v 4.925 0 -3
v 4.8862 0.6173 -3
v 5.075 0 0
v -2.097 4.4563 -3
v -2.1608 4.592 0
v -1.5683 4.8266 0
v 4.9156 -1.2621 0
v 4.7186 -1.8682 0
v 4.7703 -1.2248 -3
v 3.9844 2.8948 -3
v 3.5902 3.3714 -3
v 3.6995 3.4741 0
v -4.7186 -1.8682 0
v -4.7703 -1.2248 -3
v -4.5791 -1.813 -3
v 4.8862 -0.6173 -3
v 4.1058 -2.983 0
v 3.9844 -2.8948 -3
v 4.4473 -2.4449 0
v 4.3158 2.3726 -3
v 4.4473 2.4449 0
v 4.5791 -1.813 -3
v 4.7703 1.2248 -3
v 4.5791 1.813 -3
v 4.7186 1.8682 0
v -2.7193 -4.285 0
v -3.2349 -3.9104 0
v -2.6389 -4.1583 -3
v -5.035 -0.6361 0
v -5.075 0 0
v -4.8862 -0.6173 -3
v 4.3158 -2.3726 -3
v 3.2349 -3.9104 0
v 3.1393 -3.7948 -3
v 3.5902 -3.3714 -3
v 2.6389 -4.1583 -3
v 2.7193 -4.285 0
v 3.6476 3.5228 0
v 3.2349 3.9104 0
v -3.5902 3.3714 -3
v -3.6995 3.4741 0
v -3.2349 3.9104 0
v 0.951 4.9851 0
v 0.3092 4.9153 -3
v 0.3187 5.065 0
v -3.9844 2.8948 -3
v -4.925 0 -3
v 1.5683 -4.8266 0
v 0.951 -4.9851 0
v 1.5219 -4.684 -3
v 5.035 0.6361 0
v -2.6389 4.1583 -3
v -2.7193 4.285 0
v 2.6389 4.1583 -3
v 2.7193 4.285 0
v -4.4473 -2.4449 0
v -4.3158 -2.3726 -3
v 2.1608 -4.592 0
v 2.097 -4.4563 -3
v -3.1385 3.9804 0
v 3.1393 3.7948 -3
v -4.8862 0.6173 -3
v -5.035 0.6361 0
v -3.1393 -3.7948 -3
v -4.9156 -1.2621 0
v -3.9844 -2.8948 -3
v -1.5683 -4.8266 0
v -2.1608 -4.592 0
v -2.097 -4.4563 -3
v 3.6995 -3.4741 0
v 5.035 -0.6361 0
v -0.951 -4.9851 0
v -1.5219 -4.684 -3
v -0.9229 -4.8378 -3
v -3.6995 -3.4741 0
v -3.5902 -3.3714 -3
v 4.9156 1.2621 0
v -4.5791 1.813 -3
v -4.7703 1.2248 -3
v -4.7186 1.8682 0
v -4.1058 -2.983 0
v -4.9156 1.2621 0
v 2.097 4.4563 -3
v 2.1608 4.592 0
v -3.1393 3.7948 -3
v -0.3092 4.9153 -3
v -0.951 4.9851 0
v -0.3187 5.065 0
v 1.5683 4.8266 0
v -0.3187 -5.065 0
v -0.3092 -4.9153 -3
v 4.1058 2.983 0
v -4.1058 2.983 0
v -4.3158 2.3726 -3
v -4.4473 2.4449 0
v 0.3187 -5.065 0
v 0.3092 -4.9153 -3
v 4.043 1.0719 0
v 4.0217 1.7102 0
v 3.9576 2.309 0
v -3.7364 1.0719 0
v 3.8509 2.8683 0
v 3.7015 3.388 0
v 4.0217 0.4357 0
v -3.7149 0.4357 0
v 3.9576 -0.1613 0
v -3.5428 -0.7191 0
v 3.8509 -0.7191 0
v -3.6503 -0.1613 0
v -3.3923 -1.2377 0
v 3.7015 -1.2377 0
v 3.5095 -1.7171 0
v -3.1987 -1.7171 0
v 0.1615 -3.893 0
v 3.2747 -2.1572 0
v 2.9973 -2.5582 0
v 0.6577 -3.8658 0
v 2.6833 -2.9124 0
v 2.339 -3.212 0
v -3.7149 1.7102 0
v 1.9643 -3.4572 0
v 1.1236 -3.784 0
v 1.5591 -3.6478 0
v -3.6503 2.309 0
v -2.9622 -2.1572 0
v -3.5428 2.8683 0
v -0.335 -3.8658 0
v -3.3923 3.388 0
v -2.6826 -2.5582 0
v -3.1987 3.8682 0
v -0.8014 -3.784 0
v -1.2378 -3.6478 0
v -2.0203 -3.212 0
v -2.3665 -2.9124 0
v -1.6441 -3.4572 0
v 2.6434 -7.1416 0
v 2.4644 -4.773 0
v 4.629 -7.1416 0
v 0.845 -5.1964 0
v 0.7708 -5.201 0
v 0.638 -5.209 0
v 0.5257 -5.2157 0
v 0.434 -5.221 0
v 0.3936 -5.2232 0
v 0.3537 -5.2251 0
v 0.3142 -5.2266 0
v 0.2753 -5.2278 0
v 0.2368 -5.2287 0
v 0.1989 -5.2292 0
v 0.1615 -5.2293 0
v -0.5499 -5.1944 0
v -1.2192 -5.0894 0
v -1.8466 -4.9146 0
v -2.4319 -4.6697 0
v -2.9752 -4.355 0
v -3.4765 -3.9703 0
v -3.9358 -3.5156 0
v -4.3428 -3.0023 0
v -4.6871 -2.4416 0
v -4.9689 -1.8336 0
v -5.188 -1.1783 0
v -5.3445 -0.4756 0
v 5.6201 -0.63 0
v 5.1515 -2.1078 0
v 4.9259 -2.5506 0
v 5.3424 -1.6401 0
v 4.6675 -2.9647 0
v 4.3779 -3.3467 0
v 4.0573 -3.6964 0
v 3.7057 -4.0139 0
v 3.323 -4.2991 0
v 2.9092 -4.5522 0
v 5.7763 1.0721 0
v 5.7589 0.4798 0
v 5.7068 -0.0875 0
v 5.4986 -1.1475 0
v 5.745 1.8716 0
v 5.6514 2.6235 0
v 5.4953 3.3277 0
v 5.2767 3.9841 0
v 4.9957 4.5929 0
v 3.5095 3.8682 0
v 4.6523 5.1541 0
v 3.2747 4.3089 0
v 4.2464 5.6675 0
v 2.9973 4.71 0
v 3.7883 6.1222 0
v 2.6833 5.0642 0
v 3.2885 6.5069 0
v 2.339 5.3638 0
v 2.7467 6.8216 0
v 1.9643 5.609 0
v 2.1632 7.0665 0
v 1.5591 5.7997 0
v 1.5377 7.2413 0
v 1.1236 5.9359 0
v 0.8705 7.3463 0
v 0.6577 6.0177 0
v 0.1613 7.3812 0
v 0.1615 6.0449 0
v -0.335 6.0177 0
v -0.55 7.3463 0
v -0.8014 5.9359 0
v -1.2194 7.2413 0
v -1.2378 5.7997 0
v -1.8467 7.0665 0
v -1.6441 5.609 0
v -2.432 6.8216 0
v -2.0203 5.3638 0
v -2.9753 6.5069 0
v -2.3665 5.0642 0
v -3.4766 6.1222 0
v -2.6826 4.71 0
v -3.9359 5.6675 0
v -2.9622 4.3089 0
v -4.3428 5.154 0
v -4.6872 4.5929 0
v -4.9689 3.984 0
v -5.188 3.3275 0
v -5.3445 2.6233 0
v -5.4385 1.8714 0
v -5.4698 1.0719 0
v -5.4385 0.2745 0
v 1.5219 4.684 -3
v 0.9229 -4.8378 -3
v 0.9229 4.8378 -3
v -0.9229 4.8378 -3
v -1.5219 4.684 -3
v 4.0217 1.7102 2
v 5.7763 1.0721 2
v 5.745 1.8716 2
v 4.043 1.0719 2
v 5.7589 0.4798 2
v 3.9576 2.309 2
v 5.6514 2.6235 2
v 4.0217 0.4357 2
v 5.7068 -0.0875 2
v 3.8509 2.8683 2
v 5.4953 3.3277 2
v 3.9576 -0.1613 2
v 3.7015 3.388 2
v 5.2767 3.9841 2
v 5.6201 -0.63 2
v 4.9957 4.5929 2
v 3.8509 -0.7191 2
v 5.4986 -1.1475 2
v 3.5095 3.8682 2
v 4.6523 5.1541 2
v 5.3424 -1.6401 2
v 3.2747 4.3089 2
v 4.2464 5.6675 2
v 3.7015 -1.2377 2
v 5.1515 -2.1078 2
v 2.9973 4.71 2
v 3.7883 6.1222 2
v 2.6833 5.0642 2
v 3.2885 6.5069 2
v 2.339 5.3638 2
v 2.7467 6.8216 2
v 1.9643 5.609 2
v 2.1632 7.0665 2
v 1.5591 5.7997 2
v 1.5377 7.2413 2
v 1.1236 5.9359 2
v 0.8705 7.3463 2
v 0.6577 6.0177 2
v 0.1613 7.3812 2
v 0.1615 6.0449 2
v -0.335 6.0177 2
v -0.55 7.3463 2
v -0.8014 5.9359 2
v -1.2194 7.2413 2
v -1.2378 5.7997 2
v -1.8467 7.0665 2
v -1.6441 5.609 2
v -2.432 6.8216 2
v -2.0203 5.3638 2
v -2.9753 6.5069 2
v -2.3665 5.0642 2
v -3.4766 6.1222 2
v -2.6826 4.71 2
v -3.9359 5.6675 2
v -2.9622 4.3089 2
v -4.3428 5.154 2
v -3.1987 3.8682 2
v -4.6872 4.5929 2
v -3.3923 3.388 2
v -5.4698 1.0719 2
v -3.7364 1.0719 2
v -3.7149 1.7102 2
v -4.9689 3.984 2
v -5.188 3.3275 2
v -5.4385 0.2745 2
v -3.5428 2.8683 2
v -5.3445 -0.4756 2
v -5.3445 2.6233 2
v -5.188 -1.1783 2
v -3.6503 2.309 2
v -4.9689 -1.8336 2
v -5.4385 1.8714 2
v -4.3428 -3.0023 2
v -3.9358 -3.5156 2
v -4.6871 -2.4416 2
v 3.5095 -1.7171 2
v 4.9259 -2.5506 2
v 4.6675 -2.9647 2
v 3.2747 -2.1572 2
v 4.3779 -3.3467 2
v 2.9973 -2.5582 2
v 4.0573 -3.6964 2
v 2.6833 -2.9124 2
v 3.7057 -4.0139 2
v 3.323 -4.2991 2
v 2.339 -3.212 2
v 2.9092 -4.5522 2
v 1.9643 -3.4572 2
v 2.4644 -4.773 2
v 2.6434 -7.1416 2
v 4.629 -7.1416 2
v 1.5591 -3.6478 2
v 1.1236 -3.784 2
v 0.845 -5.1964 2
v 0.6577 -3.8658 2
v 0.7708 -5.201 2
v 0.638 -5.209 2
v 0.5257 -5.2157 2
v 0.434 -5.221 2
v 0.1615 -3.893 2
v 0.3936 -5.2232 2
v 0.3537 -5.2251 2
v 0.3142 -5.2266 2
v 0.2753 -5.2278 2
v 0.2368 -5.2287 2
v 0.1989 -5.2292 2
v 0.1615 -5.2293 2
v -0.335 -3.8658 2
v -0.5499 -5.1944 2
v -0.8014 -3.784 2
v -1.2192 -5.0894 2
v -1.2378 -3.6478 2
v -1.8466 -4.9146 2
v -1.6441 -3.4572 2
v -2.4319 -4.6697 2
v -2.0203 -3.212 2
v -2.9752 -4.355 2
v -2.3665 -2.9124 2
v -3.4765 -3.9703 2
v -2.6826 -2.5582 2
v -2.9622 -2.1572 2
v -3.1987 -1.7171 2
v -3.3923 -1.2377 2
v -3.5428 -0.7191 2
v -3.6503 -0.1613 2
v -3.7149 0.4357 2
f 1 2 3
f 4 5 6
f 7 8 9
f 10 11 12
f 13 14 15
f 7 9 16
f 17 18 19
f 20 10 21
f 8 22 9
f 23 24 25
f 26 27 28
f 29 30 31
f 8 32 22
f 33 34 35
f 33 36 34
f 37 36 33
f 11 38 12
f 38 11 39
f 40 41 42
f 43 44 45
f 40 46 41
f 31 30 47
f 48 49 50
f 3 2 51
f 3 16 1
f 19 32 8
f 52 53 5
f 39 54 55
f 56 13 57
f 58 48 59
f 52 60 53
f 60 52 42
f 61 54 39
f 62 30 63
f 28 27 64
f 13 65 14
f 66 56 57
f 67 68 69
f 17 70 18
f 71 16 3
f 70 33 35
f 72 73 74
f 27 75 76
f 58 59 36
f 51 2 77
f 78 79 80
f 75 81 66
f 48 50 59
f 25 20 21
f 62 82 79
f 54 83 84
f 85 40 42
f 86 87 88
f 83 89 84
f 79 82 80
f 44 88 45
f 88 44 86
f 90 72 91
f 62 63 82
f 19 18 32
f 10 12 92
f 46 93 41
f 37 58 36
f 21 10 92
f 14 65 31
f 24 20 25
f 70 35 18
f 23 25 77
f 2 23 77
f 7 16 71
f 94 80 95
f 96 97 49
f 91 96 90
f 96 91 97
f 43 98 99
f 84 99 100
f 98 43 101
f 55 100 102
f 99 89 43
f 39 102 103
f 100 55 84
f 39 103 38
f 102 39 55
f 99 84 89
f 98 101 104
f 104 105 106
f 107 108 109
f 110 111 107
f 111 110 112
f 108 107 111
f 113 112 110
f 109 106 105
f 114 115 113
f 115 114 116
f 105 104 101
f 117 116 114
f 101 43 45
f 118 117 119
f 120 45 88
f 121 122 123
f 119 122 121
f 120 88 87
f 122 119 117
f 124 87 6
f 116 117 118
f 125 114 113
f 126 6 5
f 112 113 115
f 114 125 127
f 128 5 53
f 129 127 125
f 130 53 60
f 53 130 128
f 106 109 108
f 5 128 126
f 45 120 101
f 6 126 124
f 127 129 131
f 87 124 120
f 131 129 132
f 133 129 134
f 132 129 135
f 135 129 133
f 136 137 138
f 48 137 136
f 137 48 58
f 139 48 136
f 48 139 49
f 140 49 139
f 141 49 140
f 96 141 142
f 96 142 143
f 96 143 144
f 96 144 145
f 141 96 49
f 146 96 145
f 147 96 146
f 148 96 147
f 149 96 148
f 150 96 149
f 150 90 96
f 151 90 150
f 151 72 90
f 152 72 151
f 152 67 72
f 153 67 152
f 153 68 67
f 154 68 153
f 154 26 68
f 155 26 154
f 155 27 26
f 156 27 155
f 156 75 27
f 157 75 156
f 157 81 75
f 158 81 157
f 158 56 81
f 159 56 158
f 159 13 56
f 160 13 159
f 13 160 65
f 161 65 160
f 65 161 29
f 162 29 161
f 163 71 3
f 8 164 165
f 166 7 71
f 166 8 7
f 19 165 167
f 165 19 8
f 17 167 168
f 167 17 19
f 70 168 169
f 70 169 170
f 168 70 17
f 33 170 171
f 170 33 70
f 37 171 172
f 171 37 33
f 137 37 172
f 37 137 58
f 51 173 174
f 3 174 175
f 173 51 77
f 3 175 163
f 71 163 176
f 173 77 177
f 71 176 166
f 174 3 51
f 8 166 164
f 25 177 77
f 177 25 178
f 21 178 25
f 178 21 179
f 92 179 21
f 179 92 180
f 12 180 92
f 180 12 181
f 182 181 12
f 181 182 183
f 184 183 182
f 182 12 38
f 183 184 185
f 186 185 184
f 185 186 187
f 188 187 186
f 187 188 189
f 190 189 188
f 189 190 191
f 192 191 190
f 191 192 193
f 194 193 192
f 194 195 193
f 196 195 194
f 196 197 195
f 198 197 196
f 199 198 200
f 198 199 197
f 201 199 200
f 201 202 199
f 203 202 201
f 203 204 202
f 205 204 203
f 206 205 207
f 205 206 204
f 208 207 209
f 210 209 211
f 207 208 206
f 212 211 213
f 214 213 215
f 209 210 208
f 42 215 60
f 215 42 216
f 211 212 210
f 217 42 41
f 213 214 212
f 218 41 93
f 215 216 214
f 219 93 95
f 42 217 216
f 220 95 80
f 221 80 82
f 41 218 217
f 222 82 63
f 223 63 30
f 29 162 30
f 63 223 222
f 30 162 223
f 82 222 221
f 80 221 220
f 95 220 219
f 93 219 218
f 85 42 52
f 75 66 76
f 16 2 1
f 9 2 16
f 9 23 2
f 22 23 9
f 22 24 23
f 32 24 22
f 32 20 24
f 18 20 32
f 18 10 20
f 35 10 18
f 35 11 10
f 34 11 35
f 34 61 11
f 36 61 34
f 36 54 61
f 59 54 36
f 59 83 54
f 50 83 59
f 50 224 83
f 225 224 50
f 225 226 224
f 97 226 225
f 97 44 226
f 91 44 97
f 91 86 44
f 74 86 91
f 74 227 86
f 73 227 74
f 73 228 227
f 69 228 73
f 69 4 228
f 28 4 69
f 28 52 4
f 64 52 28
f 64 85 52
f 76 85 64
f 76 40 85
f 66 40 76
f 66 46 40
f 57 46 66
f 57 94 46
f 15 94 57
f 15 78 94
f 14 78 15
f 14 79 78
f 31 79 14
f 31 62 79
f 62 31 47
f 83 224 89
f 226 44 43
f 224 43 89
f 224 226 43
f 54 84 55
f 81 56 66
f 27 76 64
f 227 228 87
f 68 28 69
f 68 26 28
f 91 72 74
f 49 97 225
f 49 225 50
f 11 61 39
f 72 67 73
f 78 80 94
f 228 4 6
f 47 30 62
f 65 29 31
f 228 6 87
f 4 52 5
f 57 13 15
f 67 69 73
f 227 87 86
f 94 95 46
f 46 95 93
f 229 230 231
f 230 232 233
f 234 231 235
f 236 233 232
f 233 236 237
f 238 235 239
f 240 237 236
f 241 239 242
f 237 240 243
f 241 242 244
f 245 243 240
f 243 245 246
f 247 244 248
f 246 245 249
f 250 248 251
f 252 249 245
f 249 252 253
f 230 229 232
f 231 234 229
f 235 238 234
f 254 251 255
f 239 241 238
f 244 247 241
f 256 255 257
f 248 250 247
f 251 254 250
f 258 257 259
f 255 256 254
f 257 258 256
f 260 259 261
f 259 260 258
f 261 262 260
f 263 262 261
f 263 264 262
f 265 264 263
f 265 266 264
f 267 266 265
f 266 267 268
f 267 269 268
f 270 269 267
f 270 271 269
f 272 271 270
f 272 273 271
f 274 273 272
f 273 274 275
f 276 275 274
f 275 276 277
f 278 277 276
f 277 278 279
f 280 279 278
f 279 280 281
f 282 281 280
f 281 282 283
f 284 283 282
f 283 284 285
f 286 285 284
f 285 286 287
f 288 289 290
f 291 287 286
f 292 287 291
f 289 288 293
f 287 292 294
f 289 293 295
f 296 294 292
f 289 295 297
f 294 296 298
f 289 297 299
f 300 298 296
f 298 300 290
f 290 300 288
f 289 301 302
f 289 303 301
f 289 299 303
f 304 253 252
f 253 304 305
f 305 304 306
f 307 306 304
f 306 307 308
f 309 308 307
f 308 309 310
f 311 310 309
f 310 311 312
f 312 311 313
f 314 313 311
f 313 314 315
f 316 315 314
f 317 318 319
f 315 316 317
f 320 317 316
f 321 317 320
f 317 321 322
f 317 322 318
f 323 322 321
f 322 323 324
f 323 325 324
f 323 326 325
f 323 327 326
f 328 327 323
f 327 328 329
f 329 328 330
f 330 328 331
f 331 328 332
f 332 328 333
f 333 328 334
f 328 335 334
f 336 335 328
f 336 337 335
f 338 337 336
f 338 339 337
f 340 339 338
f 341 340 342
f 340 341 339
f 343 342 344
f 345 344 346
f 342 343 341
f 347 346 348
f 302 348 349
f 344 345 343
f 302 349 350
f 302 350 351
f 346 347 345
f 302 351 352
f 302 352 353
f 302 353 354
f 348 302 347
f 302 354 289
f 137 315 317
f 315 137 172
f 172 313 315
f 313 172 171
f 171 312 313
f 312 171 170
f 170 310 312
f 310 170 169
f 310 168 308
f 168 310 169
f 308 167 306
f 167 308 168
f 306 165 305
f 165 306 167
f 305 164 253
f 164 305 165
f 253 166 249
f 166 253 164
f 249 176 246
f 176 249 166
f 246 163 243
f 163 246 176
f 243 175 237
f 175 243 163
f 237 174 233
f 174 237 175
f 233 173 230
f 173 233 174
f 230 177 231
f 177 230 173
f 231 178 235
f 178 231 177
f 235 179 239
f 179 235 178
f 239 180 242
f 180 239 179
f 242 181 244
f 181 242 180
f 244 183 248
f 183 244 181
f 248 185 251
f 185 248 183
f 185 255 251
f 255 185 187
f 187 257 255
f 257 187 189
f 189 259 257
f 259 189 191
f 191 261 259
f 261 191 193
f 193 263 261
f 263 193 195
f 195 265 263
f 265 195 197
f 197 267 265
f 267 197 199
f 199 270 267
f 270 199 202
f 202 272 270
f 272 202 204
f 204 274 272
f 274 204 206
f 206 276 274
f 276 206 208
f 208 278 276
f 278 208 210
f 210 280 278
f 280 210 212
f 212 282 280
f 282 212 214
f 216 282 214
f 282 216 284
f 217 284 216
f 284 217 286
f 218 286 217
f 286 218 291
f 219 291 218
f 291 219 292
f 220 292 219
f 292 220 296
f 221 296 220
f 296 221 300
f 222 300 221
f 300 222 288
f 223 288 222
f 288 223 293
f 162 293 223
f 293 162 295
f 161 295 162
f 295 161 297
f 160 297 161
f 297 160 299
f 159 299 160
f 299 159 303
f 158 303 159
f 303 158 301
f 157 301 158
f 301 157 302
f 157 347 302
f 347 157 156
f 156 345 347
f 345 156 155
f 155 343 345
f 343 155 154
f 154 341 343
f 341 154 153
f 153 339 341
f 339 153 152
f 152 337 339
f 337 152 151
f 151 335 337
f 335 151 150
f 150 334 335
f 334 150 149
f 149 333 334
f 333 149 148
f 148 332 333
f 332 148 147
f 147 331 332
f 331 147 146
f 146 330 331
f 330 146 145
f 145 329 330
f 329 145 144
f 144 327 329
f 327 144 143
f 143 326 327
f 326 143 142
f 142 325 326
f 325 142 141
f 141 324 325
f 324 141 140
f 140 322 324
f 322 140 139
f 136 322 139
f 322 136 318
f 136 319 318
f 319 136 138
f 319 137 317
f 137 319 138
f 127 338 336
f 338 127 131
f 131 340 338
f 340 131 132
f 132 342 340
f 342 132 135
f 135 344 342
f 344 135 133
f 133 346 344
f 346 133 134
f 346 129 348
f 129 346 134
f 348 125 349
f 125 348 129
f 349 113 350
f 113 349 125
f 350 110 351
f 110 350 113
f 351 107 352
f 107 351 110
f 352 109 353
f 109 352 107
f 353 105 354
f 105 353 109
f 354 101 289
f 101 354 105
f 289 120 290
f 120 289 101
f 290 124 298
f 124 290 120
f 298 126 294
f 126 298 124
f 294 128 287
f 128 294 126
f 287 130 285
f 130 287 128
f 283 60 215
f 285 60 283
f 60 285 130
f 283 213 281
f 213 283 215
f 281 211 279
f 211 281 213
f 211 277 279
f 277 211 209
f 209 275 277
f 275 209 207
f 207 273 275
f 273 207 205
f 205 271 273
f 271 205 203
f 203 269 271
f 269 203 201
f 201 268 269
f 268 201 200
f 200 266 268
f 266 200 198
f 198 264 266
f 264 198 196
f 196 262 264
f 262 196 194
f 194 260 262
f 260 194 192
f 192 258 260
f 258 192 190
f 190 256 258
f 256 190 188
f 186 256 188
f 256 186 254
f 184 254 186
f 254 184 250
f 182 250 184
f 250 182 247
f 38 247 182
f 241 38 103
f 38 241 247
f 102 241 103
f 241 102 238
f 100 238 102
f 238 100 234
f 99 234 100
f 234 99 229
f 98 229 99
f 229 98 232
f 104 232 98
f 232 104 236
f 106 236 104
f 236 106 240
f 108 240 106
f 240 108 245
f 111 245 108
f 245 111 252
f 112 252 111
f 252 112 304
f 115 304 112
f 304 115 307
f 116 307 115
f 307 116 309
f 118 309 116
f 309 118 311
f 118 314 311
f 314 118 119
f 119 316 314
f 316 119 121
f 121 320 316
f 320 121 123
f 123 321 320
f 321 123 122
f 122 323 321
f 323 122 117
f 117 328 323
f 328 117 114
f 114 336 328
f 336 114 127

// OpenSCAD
$fn = 50;

difference() {
	union() {
		translate(v = [0, 0, -3.0]) {
			cylinder(h = 3, r1 = 4.925, r2 = 5.075);
		}
		linear_extrude(height = 2) {
			text(font = "Impact", halign = "center", size = 12, text = "Q", valign = "center");
		}
	}
	union();
}
